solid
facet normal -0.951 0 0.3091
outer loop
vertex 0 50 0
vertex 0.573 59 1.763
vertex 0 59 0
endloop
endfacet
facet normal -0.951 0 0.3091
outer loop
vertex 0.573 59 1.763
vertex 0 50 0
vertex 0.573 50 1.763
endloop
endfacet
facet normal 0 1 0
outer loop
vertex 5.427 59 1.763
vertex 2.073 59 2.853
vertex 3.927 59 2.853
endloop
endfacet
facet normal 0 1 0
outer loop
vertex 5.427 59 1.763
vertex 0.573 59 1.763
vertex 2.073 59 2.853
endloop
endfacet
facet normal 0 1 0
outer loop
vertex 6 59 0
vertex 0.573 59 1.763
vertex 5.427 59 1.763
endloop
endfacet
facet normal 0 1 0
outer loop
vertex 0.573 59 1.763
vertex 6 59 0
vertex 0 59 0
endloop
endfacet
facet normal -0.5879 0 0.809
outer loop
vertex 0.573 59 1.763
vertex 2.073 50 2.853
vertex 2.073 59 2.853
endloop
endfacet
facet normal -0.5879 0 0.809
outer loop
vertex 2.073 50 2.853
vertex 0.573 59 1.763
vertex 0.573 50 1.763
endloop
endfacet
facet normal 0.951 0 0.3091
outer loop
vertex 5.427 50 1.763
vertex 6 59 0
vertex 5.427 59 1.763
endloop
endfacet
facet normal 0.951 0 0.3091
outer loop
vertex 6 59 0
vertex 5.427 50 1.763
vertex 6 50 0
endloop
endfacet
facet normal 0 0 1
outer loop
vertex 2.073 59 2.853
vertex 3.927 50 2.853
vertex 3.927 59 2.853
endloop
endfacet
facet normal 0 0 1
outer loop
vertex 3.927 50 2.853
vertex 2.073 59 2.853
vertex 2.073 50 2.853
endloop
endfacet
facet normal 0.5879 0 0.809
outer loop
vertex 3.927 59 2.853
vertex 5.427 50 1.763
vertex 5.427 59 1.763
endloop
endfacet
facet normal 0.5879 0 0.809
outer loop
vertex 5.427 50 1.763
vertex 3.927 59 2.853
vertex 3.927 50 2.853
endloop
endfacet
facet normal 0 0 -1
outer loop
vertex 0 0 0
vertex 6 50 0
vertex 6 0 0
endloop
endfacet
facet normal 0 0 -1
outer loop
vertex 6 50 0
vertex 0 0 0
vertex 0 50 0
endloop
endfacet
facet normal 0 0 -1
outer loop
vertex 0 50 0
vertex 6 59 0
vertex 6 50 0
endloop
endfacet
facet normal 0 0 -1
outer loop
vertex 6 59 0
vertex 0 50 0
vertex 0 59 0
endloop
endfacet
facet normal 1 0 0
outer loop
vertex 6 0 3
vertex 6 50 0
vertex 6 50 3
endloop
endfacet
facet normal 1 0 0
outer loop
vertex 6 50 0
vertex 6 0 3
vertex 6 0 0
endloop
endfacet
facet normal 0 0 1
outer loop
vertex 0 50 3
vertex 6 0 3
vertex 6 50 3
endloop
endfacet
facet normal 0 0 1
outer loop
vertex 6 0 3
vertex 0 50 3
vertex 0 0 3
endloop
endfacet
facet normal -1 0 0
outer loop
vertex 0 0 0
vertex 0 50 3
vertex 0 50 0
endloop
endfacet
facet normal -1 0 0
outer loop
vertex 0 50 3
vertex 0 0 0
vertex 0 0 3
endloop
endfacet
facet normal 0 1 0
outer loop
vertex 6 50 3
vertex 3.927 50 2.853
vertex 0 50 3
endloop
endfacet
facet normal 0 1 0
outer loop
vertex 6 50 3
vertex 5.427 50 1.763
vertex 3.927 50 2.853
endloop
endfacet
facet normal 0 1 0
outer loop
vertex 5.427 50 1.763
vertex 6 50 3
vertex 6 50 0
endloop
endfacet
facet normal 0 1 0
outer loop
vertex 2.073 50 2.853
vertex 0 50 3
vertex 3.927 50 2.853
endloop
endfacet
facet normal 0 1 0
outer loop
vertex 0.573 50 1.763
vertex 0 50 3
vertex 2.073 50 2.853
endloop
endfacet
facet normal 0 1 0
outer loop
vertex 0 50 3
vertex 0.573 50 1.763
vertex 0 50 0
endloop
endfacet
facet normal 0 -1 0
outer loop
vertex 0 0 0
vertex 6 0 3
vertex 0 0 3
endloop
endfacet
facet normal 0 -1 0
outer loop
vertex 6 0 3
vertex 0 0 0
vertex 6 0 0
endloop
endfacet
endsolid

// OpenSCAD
cube([6, 50, 3]);
rotate([-90, 0, 0]) translate([3, 0, 49]) difference() {
  cylinder(r = 3, h = 10);
  translate([-5, 0, 0]) cube([10, 10, 10]);
}
